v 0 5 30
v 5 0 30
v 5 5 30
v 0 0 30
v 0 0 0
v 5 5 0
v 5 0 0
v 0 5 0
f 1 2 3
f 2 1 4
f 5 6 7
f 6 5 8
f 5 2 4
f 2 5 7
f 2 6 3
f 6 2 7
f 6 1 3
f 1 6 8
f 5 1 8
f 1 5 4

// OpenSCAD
// Generated by generate_scads.py
cube(size=[5,5,30], center=false);
